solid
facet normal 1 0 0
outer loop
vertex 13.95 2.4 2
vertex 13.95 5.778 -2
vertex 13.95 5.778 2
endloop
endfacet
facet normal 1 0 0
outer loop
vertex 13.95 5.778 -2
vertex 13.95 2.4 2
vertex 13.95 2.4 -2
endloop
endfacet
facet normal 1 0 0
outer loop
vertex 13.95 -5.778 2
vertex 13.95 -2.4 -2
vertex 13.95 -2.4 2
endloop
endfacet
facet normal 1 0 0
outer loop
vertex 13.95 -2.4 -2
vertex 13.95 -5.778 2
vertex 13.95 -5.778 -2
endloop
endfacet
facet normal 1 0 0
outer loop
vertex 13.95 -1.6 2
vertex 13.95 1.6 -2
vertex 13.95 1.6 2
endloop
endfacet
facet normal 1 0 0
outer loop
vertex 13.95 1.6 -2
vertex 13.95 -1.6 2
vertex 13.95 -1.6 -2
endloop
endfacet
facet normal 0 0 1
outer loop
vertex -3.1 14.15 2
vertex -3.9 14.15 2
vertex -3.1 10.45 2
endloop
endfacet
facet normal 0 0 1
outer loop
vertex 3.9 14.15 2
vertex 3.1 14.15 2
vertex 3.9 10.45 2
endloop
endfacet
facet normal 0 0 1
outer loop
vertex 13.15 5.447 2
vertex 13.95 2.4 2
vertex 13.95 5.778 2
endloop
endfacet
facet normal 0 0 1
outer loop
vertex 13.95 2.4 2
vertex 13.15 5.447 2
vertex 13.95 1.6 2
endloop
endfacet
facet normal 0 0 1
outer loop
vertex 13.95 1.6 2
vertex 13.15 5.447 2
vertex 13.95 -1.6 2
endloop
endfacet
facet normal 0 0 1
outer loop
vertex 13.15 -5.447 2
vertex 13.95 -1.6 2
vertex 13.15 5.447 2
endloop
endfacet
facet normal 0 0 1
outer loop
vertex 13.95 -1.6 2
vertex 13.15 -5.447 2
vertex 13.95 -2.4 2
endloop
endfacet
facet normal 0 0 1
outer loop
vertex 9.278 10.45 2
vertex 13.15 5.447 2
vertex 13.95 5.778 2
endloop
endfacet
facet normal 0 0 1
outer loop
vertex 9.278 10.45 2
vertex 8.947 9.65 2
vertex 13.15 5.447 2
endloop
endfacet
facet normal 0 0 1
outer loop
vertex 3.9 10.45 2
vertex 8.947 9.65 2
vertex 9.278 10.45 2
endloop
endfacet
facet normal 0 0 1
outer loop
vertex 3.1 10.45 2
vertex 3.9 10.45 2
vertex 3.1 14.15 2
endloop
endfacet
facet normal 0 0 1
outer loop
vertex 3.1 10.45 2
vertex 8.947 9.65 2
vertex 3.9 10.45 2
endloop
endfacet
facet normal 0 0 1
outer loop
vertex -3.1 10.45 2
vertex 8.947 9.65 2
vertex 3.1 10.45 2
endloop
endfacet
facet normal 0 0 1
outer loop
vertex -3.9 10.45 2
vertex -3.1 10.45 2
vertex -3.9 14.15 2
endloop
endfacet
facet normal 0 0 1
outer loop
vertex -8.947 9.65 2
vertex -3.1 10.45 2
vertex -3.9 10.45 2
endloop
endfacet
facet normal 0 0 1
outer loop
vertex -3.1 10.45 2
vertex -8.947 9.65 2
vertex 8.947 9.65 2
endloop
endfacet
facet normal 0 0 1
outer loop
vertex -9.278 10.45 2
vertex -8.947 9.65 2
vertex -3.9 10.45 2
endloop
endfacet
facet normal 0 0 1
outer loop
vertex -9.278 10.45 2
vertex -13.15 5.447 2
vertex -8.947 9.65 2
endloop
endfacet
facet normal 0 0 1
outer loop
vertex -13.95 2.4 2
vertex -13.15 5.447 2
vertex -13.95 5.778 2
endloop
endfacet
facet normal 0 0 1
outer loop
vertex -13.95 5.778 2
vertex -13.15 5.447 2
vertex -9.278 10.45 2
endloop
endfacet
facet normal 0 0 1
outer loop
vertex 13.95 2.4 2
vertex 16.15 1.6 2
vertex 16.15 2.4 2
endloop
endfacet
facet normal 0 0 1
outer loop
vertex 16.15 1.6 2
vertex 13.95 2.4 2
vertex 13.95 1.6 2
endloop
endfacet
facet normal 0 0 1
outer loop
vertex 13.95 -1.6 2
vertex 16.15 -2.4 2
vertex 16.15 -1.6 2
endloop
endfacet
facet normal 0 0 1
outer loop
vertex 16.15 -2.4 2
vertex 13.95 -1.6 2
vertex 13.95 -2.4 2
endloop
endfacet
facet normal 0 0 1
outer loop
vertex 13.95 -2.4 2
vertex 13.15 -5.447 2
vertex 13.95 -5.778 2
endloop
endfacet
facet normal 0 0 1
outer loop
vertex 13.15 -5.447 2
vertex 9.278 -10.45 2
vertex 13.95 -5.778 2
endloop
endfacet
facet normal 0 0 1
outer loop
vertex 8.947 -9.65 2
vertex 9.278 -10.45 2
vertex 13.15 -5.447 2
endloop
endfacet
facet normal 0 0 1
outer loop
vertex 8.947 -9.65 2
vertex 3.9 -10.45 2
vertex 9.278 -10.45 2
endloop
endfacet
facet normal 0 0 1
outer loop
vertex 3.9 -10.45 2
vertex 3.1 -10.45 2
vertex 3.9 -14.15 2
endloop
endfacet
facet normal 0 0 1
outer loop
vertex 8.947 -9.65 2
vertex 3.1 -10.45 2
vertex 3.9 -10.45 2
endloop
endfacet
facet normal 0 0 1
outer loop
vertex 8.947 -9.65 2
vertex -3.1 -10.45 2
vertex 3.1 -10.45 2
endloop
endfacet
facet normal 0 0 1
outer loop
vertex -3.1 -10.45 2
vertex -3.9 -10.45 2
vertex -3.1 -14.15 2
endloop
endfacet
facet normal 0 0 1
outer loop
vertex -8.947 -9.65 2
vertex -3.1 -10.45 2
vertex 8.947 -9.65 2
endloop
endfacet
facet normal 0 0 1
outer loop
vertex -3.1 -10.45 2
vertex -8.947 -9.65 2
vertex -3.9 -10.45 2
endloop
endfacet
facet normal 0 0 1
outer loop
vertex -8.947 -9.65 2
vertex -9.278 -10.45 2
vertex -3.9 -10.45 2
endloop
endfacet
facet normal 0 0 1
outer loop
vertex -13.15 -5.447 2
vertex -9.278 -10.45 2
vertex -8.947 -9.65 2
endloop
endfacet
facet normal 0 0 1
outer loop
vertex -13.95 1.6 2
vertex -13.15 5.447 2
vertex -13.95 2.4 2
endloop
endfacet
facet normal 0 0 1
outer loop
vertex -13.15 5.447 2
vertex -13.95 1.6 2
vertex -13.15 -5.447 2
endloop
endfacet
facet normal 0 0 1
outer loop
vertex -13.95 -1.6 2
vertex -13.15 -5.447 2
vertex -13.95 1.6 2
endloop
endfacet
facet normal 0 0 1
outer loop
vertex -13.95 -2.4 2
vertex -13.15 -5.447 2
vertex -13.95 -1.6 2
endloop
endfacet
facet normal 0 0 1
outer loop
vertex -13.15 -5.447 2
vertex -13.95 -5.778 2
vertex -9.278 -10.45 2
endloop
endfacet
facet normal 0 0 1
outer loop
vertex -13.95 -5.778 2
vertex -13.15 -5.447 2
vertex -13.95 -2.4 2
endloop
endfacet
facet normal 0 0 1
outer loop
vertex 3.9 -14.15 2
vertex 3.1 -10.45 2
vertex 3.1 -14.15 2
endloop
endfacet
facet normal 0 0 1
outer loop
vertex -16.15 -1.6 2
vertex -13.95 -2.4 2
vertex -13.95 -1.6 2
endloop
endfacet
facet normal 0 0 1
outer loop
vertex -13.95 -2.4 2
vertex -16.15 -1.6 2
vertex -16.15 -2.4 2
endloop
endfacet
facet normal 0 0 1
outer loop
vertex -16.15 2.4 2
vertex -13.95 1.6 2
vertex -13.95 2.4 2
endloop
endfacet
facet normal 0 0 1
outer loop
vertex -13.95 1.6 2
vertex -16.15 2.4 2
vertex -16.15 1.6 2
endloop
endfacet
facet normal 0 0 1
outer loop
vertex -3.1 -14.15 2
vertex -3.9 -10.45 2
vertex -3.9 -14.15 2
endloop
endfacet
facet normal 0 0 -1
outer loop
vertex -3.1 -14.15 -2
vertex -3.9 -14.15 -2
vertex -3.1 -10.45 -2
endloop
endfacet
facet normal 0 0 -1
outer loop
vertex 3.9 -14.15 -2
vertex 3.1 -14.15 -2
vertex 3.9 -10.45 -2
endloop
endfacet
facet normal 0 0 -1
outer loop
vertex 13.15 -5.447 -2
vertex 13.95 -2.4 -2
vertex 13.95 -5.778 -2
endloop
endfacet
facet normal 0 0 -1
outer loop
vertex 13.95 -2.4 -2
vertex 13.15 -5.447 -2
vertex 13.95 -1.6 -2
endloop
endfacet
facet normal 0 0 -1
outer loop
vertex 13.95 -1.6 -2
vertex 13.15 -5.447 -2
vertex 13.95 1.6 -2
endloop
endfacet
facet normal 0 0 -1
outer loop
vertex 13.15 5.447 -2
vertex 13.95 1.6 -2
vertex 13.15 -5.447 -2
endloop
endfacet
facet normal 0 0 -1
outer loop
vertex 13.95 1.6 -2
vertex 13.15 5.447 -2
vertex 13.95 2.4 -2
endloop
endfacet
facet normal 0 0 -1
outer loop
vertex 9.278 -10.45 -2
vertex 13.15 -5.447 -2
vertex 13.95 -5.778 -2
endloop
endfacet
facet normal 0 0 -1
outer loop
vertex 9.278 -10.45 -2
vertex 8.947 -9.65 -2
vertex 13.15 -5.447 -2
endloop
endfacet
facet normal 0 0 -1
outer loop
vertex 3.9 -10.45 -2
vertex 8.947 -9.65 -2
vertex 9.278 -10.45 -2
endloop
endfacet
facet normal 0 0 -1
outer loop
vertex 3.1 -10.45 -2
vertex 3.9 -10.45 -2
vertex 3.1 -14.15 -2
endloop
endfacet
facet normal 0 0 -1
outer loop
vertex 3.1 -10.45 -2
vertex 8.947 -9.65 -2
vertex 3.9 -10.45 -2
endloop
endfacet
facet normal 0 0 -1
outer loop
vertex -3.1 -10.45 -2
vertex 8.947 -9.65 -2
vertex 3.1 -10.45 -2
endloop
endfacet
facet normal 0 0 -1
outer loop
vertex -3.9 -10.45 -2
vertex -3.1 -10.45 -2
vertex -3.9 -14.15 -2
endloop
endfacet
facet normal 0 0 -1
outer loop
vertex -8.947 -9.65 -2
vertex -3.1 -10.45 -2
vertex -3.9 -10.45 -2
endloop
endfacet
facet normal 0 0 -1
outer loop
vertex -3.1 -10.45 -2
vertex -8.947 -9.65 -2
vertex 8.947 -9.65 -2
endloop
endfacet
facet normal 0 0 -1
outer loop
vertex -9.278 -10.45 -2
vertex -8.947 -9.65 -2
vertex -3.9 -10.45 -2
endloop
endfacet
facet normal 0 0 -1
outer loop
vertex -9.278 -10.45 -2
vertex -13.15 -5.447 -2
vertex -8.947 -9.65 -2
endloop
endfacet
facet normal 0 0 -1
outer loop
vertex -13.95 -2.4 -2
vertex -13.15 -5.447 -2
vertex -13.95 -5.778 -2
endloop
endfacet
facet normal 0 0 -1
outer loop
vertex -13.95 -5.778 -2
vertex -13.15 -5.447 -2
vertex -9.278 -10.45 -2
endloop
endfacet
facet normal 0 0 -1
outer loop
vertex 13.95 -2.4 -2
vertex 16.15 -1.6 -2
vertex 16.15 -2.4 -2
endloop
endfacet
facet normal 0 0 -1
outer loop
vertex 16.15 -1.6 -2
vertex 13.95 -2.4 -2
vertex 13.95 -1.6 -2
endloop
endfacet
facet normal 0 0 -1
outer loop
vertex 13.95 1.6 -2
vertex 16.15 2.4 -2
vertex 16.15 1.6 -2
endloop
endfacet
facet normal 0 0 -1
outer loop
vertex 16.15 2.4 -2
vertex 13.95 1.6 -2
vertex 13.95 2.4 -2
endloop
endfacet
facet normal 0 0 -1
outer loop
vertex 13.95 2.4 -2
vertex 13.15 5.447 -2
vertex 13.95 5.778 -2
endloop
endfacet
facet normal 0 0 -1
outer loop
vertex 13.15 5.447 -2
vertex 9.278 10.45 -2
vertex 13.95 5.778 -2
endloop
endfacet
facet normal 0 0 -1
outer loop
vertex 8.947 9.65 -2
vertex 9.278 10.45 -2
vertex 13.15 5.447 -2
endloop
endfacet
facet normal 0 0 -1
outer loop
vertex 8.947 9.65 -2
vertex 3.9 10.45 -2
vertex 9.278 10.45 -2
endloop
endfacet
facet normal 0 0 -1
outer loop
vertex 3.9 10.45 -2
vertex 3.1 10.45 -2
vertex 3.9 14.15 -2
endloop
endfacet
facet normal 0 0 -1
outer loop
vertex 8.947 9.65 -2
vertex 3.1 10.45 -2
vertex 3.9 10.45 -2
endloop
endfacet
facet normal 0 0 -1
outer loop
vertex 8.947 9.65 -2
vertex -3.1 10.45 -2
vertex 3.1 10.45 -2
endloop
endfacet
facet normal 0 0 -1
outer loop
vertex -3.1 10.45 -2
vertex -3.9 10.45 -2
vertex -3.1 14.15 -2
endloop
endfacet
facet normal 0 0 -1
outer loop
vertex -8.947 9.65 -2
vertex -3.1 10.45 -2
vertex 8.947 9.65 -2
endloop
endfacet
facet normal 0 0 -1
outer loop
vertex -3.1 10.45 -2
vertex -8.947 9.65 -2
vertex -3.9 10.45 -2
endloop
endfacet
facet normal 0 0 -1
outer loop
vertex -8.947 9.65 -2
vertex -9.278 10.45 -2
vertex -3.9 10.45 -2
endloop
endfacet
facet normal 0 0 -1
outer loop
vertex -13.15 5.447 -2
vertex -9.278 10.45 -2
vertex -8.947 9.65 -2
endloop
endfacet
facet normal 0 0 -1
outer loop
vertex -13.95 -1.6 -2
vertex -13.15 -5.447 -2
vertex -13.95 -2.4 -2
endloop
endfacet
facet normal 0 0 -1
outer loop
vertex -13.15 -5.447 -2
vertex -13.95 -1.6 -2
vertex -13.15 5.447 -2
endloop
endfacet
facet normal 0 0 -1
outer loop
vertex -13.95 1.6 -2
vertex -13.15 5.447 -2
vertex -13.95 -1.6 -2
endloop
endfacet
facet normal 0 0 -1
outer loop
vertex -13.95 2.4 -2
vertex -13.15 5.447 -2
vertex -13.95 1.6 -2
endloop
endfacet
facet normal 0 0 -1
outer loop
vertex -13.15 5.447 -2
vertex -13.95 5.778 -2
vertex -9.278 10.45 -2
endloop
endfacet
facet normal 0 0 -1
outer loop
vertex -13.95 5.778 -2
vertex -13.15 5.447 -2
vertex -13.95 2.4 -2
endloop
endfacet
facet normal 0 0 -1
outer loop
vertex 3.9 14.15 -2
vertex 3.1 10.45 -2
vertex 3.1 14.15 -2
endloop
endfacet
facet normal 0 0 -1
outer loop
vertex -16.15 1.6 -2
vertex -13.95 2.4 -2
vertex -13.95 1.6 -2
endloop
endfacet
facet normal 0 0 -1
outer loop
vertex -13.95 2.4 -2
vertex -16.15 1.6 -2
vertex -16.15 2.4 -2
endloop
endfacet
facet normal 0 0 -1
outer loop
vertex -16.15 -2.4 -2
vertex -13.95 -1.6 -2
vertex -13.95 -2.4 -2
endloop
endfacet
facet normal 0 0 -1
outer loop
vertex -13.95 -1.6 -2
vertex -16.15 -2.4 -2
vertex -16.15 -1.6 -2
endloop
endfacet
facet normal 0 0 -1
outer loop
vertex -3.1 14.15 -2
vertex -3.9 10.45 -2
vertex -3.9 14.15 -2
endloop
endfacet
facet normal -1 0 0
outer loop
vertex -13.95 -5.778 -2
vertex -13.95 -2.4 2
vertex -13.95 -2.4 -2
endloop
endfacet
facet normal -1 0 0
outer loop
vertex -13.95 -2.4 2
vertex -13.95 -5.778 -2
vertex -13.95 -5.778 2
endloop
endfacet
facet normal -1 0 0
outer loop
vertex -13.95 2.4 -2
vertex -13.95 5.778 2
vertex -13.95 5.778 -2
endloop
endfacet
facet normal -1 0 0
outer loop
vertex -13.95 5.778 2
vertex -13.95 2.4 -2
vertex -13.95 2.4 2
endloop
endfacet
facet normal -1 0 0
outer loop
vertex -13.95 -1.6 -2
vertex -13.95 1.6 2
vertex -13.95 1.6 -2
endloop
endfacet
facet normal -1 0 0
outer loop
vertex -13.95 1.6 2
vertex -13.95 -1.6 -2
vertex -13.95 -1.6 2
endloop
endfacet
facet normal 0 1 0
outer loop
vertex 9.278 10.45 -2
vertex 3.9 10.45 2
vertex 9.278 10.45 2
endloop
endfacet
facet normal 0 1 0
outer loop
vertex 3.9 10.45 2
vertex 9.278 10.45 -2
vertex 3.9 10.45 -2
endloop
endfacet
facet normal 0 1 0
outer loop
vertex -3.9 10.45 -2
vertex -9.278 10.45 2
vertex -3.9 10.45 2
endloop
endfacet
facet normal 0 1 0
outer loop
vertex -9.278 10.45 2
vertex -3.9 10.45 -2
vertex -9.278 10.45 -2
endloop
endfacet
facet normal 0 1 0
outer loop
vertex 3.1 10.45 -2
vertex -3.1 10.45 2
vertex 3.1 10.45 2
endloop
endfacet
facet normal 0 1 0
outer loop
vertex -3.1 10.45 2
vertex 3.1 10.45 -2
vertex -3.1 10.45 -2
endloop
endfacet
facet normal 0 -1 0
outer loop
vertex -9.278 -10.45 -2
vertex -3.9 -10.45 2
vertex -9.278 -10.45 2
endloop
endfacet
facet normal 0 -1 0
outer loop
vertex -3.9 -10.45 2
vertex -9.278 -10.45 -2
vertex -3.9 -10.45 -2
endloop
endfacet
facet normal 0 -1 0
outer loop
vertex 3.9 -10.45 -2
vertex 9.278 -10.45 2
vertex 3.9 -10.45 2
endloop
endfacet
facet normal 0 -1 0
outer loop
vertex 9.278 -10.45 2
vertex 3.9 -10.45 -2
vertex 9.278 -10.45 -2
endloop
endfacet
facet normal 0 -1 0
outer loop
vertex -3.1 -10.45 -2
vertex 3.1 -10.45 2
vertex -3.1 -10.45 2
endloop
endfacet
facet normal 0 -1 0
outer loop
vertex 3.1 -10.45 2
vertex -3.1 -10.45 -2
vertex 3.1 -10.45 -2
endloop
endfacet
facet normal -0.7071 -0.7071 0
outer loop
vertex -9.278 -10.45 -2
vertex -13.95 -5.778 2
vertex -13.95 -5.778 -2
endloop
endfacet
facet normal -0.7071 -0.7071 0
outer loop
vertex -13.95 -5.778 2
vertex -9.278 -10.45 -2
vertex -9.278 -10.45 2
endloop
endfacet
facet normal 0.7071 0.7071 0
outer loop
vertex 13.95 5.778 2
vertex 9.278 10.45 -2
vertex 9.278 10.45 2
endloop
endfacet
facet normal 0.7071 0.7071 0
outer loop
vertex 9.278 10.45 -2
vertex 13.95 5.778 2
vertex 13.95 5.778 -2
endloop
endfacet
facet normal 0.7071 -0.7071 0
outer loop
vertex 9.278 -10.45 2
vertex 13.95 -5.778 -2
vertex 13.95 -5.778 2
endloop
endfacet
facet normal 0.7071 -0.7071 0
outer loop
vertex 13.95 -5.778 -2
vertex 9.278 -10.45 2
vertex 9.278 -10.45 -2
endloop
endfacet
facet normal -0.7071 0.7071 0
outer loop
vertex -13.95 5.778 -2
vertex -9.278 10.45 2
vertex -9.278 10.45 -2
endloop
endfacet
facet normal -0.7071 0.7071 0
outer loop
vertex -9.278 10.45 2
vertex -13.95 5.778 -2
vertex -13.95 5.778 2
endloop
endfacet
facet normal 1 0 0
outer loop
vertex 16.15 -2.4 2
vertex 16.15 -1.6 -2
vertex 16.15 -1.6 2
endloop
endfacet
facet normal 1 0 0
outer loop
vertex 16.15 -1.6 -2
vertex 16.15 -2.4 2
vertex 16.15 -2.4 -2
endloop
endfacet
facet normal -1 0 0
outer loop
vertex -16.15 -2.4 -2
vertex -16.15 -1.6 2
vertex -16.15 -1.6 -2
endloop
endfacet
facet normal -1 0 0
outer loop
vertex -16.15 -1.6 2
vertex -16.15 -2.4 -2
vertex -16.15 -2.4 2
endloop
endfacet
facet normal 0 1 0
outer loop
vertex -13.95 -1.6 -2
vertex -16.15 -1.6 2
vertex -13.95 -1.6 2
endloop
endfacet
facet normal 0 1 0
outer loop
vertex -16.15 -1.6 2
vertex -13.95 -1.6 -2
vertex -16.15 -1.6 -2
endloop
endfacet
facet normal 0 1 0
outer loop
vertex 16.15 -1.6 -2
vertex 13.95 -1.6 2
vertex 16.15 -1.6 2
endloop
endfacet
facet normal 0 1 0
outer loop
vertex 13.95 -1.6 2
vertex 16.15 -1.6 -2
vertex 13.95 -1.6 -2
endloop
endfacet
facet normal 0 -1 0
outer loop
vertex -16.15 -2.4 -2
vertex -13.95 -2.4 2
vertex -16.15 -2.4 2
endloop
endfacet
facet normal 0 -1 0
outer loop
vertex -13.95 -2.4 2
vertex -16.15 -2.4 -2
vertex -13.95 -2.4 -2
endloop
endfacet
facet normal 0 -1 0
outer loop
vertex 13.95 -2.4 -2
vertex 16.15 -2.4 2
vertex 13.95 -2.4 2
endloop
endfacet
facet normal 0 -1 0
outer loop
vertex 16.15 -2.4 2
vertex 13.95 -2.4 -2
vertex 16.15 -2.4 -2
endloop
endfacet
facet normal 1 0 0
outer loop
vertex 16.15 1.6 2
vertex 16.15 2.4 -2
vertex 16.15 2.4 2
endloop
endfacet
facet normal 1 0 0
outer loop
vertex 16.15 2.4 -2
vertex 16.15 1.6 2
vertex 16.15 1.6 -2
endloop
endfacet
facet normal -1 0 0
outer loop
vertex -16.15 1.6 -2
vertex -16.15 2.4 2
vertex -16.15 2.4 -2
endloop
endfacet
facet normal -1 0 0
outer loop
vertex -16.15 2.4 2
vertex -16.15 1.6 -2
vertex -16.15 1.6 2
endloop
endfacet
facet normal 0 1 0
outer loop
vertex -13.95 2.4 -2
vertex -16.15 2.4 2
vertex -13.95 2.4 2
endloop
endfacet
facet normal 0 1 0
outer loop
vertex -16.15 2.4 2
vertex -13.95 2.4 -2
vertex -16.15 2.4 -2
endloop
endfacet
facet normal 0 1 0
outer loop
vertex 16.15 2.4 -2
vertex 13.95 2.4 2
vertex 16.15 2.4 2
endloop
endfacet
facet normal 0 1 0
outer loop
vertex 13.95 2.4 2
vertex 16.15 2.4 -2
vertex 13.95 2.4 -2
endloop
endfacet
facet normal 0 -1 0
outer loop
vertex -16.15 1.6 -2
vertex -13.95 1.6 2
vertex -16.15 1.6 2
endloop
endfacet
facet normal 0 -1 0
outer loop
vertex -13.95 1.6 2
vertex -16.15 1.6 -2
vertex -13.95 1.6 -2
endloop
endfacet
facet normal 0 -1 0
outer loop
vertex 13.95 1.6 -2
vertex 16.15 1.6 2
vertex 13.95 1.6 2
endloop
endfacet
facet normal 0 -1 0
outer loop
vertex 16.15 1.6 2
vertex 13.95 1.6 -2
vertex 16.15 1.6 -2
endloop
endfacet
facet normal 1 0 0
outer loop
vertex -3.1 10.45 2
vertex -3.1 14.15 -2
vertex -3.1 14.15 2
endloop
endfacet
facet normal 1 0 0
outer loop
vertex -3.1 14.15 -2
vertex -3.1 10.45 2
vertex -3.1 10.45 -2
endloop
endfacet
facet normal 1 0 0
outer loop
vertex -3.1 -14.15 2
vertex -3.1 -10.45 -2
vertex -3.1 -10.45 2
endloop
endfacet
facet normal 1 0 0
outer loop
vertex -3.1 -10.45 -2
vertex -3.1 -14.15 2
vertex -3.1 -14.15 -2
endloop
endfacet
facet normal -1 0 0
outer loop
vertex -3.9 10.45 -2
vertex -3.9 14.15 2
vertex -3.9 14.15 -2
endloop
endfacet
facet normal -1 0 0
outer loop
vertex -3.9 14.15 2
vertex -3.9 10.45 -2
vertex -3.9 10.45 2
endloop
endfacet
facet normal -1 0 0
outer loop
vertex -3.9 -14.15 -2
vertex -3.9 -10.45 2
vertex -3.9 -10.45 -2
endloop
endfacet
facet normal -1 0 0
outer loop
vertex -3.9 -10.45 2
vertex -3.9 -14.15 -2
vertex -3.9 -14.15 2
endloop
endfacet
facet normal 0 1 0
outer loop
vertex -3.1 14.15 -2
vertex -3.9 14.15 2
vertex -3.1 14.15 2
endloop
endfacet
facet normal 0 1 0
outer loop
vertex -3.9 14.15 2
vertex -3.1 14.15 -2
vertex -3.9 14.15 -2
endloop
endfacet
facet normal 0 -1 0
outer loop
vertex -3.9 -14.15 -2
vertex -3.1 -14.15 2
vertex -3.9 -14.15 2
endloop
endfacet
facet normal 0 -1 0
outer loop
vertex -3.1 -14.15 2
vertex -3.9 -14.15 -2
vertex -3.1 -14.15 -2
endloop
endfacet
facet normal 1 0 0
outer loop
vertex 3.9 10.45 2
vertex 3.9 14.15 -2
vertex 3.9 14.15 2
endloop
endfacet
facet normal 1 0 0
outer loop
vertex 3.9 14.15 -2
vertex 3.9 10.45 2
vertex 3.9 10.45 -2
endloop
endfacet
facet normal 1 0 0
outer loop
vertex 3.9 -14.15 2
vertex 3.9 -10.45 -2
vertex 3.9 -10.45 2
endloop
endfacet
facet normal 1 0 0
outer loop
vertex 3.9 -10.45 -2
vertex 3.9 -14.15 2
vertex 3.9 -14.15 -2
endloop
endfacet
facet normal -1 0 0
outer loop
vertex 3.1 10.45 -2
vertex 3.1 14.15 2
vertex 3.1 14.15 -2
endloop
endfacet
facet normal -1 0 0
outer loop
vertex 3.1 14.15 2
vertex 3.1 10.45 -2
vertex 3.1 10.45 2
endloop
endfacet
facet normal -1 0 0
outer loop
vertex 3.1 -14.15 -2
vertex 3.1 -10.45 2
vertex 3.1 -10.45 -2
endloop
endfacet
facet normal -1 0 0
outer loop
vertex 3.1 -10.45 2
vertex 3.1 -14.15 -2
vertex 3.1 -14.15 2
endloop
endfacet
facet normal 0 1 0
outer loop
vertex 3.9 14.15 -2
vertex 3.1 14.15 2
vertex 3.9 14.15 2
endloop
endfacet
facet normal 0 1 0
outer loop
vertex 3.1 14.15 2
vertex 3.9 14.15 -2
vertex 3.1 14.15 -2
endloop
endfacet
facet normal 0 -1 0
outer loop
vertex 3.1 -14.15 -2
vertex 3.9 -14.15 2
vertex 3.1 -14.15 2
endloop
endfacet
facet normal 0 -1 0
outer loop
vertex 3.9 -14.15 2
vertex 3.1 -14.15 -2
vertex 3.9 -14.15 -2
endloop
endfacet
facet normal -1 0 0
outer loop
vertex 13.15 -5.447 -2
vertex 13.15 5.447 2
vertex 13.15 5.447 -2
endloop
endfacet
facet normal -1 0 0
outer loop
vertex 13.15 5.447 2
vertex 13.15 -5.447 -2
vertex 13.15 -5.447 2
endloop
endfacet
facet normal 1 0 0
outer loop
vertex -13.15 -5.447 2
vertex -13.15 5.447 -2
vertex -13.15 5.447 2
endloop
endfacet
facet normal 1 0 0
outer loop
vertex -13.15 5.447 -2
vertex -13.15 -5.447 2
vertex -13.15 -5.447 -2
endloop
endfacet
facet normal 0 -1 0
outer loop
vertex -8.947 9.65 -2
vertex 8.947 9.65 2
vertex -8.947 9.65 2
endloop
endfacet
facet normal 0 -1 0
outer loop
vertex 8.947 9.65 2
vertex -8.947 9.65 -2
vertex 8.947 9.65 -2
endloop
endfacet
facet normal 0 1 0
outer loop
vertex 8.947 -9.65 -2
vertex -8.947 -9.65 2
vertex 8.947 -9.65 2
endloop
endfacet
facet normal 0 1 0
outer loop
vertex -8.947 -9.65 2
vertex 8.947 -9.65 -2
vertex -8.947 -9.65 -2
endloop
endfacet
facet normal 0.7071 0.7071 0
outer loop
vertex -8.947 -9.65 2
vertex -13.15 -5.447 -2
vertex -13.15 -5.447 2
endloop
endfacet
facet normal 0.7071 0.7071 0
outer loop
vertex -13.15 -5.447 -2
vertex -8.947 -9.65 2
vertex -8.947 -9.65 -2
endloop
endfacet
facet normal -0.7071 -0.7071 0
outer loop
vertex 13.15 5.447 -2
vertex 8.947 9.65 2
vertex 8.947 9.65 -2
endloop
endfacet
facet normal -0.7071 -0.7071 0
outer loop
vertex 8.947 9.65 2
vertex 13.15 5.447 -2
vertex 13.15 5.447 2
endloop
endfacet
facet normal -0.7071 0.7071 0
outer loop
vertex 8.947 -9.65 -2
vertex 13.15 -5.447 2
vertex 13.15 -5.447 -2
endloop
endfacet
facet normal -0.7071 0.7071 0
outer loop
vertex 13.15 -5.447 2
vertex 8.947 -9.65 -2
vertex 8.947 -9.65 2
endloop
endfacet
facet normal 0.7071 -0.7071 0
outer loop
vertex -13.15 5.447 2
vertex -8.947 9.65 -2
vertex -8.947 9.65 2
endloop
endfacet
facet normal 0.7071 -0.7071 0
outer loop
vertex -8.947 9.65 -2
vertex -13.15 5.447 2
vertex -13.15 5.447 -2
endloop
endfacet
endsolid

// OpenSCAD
// Length of the spacer
l = 4;

// thickness of the spacer
t = 0.8;

// horizontal supports offset
ho = 2;

// vertical supports offset
vo = 3.5;

// diagonal bevels angle
a = 45;   

// // hairpin crossection ( 4 1/8 )
// hw = 25.6;  // width
// hh = 17.6;  // height
// hd = 25.6;  // distance between the diagonal bevels

// hairpin crossection ( 4 3/8 )
hw = 26.3;  // width
hh = 19.3;  // height
hd = 26.3;  // distance between the diagonal bevels

// mold inner dimensions
mw = 32.3;  // width
mh = 28.3;  // height


module grip_body( w, h, d, l )
{
   intersection( )
   {
      cube( [ w, h, l ], true );
      rotate( [ 0, 0, a ] )
      {
         cube( [ d,   d*2, l ], true );
      }
      rotate( [ 0, 0, -a ] )
      {
         cube( [ d,   d*2, l ], true );
      }
   }
}

difference( )
{
   union( )
   {
      grip_body( hw + 2*t, hh + 2*t, hd + 2*t, l );

      translate( [ 0, -ho, 0 ] ) { cube( [ mw, t , l ], true ); }
      translate( [ 0, ho, 0 ] ) { cube( [ mw, t , l ], true ); }
      translate( [ -vo, 0, 0 ] ) { cube( [ t , mh, l ], true ); }
      translate( [ vo, 0, 0 ] ) { cube( [ t , mh, l ], true ); }
   }

   grip_body( hw, hh, hd, l );
}
   
